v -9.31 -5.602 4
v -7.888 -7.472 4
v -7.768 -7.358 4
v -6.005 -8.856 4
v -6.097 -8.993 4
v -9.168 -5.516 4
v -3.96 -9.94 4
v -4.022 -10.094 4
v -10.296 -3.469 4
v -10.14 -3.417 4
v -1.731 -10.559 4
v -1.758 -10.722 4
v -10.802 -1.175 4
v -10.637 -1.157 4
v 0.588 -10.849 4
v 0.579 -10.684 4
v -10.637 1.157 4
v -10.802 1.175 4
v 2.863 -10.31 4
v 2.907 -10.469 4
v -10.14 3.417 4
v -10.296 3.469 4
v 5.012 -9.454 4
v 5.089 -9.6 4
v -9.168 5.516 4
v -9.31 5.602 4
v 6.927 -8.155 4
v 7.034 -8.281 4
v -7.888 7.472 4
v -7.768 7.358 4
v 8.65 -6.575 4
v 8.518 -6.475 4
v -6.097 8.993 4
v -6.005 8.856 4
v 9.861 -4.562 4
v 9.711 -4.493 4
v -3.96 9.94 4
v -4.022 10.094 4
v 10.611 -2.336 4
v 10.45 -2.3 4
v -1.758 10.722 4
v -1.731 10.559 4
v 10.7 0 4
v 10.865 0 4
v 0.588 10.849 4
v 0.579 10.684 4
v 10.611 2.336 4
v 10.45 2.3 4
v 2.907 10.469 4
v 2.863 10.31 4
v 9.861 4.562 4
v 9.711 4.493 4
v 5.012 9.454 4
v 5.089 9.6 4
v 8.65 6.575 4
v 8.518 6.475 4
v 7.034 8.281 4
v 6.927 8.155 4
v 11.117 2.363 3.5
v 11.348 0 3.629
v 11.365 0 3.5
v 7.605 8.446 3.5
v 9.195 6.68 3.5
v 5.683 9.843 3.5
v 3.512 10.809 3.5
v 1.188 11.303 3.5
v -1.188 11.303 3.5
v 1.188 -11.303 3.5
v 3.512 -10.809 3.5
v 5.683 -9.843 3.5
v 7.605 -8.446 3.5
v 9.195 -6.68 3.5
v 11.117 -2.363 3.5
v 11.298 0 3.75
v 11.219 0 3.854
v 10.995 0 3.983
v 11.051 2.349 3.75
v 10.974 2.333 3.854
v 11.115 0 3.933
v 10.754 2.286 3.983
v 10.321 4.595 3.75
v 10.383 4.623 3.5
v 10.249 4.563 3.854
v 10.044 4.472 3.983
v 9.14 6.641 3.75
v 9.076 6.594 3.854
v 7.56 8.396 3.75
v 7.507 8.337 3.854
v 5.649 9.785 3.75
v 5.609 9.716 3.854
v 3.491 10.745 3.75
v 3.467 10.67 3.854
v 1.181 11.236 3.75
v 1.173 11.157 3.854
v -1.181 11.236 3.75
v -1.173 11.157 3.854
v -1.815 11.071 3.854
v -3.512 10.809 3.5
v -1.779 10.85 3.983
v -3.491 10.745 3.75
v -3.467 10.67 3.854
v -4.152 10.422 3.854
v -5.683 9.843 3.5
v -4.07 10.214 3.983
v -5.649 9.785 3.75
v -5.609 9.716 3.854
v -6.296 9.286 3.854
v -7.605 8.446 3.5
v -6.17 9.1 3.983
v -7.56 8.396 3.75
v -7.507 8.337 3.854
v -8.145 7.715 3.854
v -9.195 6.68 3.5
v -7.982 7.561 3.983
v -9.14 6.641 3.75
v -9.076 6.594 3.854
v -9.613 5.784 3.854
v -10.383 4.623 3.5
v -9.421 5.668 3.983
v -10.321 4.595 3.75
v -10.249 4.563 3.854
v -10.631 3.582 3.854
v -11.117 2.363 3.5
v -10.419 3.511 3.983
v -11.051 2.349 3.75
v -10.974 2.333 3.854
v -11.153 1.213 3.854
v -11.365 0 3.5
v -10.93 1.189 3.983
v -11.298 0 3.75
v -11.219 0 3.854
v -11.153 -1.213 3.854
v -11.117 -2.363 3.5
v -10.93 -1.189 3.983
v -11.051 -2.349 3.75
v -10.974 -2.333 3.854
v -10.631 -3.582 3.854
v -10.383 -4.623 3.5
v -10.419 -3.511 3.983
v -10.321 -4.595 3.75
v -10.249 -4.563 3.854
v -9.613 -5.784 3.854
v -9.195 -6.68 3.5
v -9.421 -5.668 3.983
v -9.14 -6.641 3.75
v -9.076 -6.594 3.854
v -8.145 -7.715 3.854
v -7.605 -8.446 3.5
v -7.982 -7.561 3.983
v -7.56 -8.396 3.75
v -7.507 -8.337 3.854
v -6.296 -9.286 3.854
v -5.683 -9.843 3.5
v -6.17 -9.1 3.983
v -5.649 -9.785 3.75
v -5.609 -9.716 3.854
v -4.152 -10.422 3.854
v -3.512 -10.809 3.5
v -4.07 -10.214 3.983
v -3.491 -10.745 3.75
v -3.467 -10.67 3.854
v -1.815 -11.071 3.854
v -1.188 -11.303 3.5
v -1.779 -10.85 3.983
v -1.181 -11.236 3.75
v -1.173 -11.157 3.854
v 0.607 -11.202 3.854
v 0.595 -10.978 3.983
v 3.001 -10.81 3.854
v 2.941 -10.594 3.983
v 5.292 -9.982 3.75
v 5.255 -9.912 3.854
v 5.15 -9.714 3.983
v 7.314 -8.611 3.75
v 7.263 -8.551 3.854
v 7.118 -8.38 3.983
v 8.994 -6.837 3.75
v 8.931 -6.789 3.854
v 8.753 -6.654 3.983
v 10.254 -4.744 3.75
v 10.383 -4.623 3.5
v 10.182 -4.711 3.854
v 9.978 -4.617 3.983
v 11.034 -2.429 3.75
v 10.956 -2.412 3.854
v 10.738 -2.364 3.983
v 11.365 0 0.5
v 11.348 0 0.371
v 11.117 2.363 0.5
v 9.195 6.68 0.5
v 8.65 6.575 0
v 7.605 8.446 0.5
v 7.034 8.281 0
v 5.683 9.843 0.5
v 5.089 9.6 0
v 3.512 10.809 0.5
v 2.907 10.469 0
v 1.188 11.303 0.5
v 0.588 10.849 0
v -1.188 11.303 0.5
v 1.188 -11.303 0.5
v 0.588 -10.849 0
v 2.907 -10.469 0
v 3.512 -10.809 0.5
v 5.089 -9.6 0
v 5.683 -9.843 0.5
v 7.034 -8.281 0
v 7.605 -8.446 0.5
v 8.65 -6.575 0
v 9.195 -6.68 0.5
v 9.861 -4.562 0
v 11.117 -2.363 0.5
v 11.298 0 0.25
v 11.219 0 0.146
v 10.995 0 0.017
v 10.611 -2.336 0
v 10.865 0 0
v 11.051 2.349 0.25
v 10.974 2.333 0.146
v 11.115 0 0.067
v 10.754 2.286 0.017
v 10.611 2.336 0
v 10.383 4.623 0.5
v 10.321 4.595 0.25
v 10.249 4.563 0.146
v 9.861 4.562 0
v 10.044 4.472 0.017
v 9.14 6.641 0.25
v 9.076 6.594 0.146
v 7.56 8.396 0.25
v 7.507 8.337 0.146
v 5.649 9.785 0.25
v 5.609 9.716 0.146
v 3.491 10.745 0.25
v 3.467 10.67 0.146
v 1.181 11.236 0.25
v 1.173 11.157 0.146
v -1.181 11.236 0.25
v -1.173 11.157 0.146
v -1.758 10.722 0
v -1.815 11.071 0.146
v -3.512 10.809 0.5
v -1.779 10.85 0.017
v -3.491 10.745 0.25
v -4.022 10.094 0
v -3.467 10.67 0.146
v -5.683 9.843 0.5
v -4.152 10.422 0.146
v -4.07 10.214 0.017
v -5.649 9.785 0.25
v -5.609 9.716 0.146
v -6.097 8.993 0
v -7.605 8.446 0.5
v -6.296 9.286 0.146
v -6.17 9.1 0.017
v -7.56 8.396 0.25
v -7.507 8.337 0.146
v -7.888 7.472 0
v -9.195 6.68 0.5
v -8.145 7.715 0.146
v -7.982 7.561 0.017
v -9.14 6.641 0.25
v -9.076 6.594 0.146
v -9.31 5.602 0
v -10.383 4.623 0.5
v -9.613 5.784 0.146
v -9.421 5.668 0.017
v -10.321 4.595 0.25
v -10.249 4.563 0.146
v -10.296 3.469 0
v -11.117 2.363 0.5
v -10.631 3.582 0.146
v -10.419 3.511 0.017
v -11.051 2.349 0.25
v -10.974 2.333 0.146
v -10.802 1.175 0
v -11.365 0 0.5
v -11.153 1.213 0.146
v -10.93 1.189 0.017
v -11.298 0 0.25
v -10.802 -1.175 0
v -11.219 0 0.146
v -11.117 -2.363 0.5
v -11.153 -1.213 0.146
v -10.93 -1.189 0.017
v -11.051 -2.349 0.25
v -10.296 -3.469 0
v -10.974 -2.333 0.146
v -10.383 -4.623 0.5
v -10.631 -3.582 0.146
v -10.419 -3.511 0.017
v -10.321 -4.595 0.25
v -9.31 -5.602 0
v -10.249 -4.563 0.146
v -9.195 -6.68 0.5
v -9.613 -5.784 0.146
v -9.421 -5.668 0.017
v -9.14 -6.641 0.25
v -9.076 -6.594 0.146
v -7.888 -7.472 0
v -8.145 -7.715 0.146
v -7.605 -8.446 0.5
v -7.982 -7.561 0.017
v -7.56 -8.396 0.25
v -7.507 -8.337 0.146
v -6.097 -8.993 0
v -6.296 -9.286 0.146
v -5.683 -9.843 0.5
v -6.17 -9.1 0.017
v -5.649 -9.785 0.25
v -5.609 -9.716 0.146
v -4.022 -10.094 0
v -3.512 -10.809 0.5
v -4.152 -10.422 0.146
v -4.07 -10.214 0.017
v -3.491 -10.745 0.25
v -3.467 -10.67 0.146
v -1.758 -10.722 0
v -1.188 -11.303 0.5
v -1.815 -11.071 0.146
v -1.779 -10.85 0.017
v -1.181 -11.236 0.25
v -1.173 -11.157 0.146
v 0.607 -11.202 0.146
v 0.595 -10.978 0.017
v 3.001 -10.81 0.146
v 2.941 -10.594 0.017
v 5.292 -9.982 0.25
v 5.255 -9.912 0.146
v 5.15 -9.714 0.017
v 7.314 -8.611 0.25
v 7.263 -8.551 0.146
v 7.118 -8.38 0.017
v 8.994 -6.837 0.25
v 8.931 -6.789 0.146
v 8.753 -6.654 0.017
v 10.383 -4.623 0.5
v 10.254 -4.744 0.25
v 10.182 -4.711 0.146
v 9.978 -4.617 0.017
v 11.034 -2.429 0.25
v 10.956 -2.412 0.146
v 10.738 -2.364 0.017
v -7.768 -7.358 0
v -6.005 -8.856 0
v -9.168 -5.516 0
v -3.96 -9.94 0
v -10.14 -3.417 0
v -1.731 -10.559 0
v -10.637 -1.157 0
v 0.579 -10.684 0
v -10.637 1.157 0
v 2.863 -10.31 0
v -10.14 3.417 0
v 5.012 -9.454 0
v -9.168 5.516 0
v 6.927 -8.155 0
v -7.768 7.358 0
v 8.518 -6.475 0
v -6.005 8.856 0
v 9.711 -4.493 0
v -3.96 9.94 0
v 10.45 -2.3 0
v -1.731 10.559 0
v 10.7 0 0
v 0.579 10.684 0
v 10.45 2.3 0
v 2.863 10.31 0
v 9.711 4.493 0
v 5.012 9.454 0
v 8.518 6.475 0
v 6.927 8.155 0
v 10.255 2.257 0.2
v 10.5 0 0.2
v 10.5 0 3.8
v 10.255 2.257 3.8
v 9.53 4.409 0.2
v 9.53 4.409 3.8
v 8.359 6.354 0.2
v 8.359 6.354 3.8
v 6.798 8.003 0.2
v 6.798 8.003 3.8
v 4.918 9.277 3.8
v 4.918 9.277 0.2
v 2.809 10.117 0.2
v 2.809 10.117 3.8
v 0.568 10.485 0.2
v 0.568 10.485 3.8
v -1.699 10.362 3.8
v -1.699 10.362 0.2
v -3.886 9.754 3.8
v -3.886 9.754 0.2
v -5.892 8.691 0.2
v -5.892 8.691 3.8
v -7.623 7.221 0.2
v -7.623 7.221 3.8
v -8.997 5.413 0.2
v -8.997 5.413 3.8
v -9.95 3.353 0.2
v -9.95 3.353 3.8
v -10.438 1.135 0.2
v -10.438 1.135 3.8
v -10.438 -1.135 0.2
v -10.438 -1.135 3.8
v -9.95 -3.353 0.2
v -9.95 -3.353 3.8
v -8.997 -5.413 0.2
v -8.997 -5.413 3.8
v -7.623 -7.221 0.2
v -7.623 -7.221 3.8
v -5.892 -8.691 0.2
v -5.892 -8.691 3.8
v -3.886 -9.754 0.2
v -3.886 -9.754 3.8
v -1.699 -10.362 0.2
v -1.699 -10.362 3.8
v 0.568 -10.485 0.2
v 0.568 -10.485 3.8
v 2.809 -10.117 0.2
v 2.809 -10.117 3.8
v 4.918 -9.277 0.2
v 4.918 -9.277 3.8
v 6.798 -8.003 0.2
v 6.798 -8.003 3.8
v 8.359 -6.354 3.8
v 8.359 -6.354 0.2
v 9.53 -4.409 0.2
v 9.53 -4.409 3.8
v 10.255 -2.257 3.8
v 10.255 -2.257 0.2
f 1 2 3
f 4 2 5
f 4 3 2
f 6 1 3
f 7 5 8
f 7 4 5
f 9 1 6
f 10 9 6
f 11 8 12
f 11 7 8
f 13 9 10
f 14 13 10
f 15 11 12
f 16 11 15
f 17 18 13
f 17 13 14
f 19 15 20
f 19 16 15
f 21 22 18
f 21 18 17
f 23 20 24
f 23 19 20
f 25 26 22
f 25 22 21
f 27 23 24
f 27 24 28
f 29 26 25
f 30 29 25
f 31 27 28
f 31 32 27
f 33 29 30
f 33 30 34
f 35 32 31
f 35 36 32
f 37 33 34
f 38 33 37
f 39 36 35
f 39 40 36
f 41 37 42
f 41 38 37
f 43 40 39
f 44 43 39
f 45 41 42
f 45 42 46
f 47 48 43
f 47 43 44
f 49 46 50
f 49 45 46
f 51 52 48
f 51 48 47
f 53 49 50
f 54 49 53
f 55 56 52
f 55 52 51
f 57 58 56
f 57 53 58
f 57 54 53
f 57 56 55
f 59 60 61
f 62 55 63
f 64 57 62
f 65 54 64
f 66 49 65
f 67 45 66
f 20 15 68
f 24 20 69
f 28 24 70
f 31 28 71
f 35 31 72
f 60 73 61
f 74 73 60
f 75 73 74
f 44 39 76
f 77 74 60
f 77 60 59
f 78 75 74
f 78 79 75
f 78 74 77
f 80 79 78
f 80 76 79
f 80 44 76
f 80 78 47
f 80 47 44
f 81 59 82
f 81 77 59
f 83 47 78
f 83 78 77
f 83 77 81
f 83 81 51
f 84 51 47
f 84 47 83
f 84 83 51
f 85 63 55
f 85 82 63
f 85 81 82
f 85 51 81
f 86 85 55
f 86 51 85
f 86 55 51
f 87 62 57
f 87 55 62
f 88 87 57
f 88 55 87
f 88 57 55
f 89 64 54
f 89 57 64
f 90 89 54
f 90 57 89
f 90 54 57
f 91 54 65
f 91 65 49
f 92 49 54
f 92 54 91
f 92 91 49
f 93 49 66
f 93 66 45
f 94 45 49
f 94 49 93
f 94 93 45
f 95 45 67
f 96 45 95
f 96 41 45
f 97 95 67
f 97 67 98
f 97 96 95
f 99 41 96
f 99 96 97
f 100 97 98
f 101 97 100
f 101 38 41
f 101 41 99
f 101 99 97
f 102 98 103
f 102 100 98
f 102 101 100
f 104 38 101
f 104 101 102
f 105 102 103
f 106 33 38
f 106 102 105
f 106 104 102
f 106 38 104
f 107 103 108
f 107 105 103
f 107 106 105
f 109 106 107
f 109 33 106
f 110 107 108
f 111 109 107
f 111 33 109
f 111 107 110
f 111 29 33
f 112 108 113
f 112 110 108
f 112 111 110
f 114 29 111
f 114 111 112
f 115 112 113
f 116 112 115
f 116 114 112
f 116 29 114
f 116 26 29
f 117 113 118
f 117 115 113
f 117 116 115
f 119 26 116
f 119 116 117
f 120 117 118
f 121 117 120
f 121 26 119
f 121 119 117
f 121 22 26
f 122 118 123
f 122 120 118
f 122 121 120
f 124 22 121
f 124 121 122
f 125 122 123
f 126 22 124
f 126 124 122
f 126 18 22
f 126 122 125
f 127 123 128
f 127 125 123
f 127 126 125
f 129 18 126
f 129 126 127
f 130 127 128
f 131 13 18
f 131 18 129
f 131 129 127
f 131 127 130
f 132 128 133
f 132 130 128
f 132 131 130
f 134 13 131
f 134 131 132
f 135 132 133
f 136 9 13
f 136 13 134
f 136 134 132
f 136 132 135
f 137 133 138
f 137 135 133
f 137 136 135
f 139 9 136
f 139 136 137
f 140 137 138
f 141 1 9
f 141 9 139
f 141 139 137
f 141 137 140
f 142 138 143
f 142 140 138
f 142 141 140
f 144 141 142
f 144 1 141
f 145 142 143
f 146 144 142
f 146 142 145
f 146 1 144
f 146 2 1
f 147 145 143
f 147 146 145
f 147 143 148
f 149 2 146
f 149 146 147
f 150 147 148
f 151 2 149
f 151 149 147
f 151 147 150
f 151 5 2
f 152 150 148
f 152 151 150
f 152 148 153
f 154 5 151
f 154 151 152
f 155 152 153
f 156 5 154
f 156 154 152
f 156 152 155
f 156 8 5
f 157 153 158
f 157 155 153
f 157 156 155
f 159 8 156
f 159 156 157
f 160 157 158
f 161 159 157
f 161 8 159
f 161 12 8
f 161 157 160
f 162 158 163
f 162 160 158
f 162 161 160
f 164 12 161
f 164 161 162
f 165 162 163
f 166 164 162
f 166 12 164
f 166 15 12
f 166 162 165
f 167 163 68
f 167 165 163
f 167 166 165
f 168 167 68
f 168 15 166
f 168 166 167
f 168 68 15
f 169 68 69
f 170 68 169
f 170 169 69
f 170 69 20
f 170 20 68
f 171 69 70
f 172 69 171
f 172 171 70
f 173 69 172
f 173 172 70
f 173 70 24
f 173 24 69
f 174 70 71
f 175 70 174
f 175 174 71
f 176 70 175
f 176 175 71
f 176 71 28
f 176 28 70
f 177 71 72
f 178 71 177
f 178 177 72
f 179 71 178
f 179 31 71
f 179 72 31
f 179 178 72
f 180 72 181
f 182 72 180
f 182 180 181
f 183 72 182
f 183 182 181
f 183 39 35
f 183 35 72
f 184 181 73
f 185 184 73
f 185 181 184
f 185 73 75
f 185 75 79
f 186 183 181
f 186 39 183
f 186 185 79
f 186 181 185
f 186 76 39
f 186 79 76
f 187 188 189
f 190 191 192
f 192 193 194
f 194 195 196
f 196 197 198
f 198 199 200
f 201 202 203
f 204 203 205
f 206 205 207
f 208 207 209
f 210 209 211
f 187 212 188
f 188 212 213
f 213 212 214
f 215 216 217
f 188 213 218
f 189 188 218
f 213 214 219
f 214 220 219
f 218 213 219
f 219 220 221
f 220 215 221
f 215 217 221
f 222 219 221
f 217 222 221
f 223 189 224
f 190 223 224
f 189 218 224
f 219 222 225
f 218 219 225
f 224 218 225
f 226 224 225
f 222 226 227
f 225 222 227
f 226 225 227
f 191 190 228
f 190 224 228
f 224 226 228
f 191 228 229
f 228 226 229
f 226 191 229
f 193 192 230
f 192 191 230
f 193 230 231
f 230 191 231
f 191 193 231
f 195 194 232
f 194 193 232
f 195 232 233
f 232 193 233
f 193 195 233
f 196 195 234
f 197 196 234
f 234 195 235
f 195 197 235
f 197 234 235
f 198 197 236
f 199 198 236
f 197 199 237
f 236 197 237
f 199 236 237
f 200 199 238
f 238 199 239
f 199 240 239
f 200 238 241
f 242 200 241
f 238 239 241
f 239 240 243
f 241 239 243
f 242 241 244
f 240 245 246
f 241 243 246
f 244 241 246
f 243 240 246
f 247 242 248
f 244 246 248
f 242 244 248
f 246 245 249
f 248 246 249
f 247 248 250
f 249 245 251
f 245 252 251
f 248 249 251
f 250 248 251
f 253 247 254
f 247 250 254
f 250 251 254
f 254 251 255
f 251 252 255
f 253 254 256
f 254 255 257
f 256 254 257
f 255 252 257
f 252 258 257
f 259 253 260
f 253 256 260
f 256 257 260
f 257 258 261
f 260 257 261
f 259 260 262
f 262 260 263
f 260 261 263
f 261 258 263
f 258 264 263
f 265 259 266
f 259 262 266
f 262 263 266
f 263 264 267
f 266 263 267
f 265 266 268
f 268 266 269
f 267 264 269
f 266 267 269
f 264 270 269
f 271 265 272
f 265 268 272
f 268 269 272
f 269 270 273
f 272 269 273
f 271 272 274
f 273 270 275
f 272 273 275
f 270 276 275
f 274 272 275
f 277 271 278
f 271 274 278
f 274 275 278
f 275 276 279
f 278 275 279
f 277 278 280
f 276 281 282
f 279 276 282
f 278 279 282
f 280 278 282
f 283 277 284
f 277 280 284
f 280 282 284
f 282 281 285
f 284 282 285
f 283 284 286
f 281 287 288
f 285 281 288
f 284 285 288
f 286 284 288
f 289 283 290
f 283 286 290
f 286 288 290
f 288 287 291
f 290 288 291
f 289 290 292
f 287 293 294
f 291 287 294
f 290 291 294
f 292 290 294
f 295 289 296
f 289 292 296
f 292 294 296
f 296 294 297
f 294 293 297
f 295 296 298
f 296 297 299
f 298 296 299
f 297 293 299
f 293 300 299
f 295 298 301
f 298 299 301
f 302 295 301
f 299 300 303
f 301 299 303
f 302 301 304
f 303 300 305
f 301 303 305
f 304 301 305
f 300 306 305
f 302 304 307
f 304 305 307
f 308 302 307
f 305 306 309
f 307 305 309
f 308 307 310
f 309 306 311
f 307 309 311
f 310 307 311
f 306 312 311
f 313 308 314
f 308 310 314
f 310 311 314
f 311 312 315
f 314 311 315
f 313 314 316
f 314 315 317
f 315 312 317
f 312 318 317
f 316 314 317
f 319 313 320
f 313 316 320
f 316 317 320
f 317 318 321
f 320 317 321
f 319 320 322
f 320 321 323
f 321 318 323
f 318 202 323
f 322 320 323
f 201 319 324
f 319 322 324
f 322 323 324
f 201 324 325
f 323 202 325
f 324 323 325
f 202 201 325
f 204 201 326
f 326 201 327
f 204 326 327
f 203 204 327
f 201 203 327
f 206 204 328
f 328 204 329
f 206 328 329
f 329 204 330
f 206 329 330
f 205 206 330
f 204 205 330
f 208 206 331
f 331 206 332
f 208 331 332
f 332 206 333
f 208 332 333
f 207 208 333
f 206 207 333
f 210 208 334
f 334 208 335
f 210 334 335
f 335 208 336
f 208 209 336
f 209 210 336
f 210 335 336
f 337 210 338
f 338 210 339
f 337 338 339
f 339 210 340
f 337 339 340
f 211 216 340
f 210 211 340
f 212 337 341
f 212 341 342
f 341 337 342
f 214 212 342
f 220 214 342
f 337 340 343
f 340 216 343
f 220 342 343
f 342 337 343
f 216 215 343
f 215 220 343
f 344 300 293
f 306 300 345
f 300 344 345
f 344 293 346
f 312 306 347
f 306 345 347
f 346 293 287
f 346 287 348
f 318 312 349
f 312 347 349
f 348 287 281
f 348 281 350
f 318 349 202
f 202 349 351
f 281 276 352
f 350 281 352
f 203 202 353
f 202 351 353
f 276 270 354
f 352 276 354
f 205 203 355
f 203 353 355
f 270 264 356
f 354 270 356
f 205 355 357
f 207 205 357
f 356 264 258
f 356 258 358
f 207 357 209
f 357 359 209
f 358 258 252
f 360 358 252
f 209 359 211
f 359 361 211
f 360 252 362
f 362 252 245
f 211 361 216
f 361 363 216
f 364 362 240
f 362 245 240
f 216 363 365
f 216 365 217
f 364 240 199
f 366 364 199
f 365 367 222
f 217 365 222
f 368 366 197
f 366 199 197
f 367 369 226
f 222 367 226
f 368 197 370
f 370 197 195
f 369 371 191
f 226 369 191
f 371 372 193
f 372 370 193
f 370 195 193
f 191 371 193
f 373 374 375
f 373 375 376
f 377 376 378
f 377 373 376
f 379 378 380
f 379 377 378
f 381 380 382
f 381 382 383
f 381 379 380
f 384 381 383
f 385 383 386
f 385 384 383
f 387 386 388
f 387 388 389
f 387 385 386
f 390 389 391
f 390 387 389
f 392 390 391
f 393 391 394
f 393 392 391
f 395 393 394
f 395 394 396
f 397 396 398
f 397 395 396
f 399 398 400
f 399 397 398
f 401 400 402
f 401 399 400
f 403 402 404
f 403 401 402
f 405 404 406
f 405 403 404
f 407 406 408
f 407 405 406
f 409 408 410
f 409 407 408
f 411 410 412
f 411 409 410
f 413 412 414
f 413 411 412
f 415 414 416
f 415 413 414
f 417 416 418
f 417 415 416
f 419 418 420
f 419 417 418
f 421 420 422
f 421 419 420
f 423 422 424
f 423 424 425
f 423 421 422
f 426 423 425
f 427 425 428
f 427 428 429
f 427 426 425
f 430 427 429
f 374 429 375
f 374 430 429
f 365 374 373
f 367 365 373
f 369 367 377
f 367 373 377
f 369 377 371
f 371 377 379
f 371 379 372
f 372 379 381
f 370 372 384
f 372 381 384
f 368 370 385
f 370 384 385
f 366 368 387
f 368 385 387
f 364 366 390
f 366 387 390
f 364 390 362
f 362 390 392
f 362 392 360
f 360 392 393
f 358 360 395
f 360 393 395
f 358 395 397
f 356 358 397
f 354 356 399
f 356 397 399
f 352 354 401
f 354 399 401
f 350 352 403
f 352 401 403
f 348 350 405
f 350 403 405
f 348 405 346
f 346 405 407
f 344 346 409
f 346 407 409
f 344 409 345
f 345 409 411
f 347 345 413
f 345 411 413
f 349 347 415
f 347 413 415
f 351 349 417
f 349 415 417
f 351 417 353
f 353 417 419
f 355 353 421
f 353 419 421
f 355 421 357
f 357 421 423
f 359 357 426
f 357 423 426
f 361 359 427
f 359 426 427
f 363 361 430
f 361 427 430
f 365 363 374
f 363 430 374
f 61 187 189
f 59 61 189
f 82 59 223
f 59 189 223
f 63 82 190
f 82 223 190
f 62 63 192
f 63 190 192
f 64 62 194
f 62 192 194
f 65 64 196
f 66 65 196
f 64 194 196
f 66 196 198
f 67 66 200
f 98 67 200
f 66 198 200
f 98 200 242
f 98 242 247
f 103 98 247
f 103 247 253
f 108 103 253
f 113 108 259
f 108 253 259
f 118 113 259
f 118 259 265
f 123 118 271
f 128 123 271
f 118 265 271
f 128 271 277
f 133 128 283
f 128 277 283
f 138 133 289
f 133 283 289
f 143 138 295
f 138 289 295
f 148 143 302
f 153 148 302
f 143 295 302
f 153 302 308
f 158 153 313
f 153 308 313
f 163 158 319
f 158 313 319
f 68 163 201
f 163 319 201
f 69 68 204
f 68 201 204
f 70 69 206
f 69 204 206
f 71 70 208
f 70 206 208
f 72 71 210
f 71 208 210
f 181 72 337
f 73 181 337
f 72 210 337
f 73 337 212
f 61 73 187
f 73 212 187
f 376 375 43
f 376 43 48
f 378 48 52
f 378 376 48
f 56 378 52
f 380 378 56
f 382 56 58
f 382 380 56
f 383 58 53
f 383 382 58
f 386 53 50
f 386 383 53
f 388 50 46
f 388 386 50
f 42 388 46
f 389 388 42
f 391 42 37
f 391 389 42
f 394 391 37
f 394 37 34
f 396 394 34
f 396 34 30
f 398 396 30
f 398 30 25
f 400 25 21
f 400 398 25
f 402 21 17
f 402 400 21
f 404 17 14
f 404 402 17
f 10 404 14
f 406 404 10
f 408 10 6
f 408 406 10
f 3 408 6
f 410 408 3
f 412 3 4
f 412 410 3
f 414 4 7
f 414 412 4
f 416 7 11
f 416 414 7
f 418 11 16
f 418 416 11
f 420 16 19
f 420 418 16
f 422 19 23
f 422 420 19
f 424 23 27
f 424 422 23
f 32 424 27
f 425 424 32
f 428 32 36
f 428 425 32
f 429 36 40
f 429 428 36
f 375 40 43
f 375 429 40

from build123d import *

# Parameters (mm, degrees)
F0_R     = 11.365202
F0_R_2   = 10.5
F1_DEPTH = 4
F2_R     = 0.5
F3_SIZE  = 0.2


with BuildPart() as f1:
    # F0 (on Top) → F1 (new body)
    with BuildSketch(Plane.XY):
        Circle(F0_R)
        Circle(F0_R_2, mode=Mode.SUBTRACT)
    extrude(amount=F1_DEPTH)

    # F2
    f2_edges = [f1.edges().sort_by_distance(p)[0] for p in [
        (-11.365202, 0, 0),
        (-11.365202, 0, 4),
    ]]
    fillet(f2_edges, radius=F2_R)

    # F3
    f3_edges = [f1.edges().sort_by_distance(p)[0] for p in [
        (-10.5, 0, 0),
        (-10.5, 0, 4),
    ]]
    chamfer(f3_edges, length=F3_SIZE)


solid = f1.part
